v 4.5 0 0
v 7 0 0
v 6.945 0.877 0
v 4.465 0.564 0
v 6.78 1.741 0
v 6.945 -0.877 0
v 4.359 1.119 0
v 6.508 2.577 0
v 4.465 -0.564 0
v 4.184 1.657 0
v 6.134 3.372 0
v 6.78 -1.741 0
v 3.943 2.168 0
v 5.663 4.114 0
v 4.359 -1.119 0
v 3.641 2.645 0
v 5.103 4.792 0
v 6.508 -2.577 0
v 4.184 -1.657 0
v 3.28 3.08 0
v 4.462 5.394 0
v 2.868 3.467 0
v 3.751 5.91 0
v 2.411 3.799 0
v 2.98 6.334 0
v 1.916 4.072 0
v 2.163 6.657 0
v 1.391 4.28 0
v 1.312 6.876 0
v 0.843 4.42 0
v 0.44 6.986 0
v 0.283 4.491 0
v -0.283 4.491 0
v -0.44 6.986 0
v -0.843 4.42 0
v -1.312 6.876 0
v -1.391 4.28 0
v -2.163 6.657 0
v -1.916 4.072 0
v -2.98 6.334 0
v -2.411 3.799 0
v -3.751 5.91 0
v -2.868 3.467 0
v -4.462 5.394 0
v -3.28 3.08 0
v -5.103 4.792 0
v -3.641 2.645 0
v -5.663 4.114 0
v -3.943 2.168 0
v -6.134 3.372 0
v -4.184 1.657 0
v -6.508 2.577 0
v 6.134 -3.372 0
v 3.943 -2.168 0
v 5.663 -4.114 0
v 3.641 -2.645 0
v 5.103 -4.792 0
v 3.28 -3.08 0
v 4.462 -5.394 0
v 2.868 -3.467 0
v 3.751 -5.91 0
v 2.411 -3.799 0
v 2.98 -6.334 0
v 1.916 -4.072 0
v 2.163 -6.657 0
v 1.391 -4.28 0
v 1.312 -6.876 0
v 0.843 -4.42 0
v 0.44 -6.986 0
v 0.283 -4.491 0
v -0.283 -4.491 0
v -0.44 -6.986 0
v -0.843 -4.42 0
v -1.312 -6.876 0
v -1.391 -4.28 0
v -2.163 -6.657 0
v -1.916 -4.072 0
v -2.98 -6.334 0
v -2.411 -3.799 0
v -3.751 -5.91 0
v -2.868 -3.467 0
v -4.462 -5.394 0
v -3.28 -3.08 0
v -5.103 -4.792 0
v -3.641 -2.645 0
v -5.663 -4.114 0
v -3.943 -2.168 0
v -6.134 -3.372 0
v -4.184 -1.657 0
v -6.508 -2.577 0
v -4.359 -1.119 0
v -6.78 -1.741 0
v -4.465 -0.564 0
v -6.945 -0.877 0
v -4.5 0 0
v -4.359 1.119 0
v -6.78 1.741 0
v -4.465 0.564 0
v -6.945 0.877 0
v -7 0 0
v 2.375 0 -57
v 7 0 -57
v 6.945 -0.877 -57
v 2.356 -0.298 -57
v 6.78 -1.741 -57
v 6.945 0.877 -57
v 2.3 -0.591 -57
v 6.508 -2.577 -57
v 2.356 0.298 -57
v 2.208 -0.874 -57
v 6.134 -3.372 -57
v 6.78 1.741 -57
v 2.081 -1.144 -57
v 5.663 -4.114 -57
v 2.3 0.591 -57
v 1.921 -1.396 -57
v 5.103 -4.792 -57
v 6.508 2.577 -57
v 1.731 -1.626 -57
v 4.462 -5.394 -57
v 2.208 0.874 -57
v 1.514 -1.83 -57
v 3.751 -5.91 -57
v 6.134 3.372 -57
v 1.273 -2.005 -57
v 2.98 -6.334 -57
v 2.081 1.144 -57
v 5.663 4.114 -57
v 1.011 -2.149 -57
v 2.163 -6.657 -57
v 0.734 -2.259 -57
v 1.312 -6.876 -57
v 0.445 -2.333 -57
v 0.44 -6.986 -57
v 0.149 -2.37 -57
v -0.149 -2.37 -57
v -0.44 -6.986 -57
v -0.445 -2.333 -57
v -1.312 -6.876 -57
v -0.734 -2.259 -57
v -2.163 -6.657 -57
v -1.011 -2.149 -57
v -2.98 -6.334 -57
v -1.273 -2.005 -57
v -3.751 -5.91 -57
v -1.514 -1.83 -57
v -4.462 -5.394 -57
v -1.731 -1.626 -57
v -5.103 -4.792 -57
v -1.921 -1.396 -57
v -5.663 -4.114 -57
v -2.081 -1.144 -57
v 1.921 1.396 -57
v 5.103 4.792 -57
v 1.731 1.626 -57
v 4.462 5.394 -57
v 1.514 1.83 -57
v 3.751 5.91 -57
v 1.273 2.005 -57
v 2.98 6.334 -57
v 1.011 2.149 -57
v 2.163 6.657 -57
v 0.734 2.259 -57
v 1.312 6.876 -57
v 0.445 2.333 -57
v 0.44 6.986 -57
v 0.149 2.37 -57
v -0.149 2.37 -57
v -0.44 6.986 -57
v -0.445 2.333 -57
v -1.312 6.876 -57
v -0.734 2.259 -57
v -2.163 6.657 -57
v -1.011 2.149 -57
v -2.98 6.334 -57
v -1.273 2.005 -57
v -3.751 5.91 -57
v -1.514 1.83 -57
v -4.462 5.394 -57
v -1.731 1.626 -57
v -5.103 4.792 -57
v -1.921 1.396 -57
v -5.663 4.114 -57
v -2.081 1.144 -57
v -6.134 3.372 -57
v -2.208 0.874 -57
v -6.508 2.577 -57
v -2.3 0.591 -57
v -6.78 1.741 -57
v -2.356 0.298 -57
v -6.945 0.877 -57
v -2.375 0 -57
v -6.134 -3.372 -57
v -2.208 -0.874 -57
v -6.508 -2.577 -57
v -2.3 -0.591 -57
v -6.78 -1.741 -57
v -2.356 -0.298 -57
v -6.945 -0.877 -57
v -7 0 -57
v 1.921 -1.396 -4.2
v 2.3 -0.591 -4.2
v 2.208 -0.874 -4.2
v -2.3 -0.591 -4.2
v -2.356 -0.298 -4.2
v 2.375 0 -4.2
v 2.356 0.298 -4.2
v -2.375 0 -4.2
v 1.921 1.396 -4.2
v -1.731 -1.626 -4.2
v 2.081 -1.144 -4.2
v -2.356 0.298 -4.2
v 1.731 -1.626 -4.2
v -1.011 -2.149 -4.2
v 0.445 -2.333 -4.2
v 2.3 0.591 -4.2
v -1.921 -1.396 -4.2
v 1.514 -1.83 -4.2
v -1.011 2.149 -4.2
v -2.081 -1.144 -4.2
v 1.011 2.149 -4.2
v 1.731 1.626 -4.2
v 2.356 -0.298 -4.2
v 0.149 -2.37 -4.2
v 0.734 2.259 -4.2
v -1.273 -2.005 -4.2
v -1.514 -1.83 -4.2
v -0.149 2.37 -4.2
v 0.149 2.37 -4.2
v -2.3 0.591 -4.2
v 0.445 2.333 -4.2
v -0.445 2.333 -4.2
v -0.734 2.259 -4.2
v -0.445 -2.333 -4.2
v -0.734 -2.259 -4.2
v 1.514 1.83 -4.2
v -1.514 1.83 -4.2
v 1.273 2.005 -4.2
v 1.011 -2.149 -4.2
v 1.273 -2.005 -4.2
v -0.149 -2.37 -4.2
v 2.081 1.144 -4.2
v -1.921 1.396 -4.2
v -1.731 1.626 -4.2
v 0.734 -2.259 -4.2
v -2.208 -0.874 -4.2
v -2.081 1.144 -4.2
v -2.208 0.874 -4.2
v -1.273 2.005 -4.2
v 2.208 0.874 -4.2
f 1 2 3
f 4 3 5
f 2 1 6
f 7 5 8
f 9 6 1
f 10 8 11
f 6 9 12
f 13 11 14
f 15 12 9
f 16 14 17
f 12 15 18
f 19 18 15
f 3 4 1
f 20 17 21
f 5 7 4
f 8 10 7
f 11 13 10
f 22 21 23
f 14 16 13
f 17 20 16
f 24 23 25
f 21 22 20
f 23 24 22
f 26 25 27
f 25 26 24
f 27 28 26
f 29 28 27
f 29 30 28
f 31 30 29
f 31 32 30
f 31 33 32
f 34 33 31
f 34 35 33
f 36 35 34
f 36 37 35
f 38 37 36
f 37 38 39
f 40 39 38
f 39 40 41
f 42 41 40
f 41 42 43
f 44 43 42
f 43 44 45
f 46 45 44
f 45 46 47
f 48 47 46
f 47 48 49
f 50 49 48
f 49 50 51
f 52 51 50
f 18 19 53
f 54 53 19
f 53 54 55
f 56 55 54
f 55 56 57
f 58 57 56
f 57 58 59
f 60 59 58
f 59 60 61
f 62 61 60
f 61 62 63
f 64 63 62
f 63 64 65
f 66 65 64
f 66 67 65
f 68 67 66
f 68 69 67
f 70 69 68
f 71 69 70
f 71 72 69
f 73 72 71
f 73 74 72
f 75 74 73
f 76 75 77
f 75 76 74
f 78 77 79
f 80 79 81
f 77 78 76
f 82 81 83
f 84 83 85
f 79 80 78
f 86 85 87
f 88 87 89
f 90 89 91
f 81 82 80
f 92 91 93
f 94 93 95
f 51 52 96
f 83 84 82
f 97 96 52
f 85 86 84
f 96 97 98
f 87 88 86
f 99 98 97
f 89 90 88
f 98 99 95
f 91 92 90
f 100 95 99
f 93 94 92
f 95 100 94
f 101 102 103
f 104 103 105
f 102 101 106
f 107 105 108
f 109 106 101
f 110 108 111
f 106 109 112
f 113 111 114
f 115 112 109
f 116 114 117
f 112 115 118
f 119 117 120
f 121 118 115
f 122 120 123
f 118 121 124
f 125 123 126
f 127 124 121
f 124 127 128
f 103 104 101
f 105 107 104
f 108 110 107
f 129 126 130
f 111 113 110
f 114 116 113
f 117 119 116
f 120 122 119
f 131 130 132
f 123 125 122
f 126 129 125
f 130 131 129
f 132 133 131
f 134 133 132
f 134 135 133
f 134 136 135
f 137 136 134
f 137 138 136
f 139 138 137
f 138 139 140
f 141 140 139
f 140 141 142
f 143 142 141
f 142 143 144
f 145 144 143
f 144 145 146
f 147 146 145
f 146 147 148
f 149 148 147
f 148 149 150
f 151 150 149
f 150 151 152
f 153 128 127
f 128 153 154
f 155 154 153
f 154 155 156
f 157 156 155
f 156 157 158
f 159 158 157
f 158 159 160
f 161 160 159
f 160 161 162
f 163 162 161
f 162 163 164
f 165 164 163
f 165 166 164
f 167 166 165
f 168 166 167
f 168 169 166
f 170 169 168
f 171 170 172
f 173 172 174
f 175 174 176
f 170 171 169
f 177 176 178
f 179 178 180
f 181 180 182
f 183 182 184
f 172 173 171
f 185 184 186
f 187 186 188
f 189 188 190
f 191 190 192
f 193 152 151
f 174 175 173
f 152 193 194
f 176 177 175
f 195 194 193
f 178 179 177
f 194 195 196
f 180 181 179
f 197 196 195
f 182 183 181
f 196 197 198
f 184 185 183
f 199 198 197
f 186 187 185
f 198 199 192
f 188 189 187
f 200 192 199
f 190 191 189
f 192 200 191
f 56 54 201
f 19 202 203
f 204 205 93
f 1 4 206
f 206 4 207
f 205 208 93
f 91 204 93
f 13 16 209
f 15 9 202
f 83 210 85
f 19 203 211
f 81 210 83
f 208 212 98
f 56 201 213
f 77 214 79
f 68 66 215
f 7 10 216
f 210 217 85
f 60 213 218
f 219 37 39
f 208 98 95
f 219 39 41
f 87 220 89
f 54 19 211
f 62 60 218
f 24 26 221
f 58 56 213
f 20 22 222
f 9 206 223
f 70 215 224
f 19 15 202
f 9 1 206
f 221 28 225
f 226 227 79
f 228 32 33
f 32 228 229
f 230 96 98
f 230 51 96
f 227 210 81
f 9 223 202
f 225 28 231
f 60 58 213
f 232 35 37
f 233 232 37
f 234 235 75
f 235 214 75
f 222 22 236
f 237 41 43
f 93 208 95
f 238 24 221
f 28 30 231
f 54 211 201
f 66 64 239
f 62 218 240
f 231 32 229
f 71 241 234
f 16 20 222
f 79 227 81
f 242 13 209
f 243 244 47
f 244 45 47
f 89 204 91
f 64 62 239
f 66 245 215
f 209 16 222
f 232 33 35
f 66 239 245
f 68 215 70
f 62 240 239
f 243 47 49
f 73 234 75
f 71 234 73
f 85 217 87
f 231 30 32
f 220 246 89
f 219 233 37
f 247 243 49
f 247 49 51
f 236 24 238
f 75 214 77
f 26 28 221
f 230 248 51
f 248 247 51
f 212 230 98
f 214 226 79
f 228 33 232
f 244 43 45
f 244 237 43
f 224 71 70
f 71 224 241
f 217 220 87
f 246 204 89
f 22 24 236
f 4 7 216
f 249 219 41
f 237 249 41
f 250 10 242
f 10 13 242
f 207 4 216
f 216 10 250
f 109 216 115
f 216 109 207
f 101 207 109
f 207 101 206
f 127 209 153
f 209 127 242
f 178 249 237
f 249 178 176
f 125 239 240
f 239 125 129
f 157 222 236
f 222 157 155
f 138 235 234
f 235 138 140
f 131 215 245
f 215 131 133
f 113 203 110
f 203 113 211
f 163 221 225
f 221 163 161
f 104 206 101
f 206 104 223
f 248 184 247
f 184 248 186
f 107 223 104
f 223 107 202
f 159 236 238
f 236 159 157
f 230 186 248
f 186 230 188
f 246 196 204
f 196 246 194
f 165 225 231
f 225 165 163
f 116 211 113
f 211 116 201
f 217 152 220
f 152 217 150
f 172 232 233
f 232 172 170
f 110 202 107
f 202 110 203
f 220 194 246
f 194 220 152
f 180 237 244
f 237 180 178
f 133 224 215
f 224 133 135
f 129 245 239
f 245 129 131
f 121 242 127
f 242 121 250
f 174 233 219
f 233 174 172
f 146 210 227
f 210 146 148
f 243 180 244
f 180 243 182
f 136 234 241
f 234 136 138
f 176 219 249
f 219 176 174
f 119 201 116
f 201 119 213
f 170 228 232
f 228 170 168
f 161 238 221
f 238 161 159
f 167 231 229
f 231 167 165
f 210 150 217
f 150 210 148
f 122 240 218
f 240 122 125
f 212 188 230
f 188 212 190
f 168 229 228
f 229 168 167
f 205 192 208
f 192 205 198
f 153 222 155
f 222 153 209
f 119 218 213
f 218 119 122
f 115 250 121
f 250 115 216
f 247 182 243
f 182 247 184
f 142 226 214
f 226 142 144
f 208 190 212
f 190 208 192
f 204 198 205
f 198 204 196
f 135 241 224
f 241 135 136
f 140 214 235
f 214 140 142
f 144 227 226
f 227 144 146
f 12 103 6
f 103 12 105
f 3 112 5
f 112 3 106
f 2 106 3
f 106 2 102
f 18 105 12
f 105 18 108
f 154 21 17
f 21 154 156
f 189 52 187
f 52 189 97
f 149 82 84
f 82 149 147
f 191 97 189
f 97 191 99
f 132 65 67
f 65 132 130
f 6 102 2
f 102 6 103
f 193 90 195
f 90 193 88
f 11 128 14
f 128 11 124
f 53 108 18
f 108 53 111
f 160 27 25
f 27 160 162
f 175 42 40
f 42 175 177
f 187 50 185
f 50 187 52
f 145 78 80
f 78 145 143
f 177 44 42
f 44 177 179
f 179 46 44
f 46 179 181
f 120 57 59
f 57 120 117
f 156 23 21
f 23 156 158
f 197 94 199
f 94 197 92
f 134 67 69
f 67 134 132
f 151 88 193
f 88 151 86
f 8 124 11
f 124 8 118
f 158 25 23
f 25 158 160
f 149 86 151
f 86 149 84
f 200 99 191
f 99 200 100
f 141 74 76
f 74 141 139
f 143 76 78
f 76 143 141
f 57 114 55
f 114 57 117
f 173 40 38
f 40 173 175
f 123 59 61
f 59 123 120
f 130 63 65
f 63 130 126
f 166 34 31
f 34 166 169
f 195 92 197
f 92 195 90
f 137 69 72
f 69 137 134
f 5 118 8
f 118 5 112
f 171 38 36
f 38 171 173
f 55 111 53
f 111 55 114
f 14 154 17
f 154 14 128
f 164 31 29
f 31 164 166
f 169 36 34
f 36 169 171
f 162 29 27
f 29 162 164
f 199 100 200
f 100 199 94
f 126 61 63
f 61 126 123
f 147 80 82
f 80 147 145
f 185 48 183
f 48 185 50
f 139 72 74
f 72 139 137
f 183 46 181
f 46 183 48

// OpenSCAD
$fn = 50;


difference() {
	union() {
		translate(v = [0, 0, -57.0000000000]) {
			cylinder(h = 57, r = 7.0000000000);
		}
		cylinder(h = 0, r = 17.0000000000);
	}
	union() {
		translate(v = [0, 0, 0]) {
			rotate(a = [0, 0, 0]) {
				difference() {
					union() {
						#translate(v = [0, 0, -57.0000000000]) {
							cylinder(h = 57, r = 2.2500000000);
						}
						#translate(v = [0, 0, -4.2000000000]) {
							cylinder(h = 4.2000000000, r = 7.0000000000, r1 = 2.3750000000, r2 = 4.5000000000);
						}
						#translate(v = [0, 0, -57.0000000000]) {
							cylinder(h = 57, r = 2.3750000000);
						}
						#translate(v = [0, 0, -57.0000000000]) {
							cylinder(h = 57, r = 2.2500000000);
						}
					}
					union();
				}
			}
		}
	}
}
